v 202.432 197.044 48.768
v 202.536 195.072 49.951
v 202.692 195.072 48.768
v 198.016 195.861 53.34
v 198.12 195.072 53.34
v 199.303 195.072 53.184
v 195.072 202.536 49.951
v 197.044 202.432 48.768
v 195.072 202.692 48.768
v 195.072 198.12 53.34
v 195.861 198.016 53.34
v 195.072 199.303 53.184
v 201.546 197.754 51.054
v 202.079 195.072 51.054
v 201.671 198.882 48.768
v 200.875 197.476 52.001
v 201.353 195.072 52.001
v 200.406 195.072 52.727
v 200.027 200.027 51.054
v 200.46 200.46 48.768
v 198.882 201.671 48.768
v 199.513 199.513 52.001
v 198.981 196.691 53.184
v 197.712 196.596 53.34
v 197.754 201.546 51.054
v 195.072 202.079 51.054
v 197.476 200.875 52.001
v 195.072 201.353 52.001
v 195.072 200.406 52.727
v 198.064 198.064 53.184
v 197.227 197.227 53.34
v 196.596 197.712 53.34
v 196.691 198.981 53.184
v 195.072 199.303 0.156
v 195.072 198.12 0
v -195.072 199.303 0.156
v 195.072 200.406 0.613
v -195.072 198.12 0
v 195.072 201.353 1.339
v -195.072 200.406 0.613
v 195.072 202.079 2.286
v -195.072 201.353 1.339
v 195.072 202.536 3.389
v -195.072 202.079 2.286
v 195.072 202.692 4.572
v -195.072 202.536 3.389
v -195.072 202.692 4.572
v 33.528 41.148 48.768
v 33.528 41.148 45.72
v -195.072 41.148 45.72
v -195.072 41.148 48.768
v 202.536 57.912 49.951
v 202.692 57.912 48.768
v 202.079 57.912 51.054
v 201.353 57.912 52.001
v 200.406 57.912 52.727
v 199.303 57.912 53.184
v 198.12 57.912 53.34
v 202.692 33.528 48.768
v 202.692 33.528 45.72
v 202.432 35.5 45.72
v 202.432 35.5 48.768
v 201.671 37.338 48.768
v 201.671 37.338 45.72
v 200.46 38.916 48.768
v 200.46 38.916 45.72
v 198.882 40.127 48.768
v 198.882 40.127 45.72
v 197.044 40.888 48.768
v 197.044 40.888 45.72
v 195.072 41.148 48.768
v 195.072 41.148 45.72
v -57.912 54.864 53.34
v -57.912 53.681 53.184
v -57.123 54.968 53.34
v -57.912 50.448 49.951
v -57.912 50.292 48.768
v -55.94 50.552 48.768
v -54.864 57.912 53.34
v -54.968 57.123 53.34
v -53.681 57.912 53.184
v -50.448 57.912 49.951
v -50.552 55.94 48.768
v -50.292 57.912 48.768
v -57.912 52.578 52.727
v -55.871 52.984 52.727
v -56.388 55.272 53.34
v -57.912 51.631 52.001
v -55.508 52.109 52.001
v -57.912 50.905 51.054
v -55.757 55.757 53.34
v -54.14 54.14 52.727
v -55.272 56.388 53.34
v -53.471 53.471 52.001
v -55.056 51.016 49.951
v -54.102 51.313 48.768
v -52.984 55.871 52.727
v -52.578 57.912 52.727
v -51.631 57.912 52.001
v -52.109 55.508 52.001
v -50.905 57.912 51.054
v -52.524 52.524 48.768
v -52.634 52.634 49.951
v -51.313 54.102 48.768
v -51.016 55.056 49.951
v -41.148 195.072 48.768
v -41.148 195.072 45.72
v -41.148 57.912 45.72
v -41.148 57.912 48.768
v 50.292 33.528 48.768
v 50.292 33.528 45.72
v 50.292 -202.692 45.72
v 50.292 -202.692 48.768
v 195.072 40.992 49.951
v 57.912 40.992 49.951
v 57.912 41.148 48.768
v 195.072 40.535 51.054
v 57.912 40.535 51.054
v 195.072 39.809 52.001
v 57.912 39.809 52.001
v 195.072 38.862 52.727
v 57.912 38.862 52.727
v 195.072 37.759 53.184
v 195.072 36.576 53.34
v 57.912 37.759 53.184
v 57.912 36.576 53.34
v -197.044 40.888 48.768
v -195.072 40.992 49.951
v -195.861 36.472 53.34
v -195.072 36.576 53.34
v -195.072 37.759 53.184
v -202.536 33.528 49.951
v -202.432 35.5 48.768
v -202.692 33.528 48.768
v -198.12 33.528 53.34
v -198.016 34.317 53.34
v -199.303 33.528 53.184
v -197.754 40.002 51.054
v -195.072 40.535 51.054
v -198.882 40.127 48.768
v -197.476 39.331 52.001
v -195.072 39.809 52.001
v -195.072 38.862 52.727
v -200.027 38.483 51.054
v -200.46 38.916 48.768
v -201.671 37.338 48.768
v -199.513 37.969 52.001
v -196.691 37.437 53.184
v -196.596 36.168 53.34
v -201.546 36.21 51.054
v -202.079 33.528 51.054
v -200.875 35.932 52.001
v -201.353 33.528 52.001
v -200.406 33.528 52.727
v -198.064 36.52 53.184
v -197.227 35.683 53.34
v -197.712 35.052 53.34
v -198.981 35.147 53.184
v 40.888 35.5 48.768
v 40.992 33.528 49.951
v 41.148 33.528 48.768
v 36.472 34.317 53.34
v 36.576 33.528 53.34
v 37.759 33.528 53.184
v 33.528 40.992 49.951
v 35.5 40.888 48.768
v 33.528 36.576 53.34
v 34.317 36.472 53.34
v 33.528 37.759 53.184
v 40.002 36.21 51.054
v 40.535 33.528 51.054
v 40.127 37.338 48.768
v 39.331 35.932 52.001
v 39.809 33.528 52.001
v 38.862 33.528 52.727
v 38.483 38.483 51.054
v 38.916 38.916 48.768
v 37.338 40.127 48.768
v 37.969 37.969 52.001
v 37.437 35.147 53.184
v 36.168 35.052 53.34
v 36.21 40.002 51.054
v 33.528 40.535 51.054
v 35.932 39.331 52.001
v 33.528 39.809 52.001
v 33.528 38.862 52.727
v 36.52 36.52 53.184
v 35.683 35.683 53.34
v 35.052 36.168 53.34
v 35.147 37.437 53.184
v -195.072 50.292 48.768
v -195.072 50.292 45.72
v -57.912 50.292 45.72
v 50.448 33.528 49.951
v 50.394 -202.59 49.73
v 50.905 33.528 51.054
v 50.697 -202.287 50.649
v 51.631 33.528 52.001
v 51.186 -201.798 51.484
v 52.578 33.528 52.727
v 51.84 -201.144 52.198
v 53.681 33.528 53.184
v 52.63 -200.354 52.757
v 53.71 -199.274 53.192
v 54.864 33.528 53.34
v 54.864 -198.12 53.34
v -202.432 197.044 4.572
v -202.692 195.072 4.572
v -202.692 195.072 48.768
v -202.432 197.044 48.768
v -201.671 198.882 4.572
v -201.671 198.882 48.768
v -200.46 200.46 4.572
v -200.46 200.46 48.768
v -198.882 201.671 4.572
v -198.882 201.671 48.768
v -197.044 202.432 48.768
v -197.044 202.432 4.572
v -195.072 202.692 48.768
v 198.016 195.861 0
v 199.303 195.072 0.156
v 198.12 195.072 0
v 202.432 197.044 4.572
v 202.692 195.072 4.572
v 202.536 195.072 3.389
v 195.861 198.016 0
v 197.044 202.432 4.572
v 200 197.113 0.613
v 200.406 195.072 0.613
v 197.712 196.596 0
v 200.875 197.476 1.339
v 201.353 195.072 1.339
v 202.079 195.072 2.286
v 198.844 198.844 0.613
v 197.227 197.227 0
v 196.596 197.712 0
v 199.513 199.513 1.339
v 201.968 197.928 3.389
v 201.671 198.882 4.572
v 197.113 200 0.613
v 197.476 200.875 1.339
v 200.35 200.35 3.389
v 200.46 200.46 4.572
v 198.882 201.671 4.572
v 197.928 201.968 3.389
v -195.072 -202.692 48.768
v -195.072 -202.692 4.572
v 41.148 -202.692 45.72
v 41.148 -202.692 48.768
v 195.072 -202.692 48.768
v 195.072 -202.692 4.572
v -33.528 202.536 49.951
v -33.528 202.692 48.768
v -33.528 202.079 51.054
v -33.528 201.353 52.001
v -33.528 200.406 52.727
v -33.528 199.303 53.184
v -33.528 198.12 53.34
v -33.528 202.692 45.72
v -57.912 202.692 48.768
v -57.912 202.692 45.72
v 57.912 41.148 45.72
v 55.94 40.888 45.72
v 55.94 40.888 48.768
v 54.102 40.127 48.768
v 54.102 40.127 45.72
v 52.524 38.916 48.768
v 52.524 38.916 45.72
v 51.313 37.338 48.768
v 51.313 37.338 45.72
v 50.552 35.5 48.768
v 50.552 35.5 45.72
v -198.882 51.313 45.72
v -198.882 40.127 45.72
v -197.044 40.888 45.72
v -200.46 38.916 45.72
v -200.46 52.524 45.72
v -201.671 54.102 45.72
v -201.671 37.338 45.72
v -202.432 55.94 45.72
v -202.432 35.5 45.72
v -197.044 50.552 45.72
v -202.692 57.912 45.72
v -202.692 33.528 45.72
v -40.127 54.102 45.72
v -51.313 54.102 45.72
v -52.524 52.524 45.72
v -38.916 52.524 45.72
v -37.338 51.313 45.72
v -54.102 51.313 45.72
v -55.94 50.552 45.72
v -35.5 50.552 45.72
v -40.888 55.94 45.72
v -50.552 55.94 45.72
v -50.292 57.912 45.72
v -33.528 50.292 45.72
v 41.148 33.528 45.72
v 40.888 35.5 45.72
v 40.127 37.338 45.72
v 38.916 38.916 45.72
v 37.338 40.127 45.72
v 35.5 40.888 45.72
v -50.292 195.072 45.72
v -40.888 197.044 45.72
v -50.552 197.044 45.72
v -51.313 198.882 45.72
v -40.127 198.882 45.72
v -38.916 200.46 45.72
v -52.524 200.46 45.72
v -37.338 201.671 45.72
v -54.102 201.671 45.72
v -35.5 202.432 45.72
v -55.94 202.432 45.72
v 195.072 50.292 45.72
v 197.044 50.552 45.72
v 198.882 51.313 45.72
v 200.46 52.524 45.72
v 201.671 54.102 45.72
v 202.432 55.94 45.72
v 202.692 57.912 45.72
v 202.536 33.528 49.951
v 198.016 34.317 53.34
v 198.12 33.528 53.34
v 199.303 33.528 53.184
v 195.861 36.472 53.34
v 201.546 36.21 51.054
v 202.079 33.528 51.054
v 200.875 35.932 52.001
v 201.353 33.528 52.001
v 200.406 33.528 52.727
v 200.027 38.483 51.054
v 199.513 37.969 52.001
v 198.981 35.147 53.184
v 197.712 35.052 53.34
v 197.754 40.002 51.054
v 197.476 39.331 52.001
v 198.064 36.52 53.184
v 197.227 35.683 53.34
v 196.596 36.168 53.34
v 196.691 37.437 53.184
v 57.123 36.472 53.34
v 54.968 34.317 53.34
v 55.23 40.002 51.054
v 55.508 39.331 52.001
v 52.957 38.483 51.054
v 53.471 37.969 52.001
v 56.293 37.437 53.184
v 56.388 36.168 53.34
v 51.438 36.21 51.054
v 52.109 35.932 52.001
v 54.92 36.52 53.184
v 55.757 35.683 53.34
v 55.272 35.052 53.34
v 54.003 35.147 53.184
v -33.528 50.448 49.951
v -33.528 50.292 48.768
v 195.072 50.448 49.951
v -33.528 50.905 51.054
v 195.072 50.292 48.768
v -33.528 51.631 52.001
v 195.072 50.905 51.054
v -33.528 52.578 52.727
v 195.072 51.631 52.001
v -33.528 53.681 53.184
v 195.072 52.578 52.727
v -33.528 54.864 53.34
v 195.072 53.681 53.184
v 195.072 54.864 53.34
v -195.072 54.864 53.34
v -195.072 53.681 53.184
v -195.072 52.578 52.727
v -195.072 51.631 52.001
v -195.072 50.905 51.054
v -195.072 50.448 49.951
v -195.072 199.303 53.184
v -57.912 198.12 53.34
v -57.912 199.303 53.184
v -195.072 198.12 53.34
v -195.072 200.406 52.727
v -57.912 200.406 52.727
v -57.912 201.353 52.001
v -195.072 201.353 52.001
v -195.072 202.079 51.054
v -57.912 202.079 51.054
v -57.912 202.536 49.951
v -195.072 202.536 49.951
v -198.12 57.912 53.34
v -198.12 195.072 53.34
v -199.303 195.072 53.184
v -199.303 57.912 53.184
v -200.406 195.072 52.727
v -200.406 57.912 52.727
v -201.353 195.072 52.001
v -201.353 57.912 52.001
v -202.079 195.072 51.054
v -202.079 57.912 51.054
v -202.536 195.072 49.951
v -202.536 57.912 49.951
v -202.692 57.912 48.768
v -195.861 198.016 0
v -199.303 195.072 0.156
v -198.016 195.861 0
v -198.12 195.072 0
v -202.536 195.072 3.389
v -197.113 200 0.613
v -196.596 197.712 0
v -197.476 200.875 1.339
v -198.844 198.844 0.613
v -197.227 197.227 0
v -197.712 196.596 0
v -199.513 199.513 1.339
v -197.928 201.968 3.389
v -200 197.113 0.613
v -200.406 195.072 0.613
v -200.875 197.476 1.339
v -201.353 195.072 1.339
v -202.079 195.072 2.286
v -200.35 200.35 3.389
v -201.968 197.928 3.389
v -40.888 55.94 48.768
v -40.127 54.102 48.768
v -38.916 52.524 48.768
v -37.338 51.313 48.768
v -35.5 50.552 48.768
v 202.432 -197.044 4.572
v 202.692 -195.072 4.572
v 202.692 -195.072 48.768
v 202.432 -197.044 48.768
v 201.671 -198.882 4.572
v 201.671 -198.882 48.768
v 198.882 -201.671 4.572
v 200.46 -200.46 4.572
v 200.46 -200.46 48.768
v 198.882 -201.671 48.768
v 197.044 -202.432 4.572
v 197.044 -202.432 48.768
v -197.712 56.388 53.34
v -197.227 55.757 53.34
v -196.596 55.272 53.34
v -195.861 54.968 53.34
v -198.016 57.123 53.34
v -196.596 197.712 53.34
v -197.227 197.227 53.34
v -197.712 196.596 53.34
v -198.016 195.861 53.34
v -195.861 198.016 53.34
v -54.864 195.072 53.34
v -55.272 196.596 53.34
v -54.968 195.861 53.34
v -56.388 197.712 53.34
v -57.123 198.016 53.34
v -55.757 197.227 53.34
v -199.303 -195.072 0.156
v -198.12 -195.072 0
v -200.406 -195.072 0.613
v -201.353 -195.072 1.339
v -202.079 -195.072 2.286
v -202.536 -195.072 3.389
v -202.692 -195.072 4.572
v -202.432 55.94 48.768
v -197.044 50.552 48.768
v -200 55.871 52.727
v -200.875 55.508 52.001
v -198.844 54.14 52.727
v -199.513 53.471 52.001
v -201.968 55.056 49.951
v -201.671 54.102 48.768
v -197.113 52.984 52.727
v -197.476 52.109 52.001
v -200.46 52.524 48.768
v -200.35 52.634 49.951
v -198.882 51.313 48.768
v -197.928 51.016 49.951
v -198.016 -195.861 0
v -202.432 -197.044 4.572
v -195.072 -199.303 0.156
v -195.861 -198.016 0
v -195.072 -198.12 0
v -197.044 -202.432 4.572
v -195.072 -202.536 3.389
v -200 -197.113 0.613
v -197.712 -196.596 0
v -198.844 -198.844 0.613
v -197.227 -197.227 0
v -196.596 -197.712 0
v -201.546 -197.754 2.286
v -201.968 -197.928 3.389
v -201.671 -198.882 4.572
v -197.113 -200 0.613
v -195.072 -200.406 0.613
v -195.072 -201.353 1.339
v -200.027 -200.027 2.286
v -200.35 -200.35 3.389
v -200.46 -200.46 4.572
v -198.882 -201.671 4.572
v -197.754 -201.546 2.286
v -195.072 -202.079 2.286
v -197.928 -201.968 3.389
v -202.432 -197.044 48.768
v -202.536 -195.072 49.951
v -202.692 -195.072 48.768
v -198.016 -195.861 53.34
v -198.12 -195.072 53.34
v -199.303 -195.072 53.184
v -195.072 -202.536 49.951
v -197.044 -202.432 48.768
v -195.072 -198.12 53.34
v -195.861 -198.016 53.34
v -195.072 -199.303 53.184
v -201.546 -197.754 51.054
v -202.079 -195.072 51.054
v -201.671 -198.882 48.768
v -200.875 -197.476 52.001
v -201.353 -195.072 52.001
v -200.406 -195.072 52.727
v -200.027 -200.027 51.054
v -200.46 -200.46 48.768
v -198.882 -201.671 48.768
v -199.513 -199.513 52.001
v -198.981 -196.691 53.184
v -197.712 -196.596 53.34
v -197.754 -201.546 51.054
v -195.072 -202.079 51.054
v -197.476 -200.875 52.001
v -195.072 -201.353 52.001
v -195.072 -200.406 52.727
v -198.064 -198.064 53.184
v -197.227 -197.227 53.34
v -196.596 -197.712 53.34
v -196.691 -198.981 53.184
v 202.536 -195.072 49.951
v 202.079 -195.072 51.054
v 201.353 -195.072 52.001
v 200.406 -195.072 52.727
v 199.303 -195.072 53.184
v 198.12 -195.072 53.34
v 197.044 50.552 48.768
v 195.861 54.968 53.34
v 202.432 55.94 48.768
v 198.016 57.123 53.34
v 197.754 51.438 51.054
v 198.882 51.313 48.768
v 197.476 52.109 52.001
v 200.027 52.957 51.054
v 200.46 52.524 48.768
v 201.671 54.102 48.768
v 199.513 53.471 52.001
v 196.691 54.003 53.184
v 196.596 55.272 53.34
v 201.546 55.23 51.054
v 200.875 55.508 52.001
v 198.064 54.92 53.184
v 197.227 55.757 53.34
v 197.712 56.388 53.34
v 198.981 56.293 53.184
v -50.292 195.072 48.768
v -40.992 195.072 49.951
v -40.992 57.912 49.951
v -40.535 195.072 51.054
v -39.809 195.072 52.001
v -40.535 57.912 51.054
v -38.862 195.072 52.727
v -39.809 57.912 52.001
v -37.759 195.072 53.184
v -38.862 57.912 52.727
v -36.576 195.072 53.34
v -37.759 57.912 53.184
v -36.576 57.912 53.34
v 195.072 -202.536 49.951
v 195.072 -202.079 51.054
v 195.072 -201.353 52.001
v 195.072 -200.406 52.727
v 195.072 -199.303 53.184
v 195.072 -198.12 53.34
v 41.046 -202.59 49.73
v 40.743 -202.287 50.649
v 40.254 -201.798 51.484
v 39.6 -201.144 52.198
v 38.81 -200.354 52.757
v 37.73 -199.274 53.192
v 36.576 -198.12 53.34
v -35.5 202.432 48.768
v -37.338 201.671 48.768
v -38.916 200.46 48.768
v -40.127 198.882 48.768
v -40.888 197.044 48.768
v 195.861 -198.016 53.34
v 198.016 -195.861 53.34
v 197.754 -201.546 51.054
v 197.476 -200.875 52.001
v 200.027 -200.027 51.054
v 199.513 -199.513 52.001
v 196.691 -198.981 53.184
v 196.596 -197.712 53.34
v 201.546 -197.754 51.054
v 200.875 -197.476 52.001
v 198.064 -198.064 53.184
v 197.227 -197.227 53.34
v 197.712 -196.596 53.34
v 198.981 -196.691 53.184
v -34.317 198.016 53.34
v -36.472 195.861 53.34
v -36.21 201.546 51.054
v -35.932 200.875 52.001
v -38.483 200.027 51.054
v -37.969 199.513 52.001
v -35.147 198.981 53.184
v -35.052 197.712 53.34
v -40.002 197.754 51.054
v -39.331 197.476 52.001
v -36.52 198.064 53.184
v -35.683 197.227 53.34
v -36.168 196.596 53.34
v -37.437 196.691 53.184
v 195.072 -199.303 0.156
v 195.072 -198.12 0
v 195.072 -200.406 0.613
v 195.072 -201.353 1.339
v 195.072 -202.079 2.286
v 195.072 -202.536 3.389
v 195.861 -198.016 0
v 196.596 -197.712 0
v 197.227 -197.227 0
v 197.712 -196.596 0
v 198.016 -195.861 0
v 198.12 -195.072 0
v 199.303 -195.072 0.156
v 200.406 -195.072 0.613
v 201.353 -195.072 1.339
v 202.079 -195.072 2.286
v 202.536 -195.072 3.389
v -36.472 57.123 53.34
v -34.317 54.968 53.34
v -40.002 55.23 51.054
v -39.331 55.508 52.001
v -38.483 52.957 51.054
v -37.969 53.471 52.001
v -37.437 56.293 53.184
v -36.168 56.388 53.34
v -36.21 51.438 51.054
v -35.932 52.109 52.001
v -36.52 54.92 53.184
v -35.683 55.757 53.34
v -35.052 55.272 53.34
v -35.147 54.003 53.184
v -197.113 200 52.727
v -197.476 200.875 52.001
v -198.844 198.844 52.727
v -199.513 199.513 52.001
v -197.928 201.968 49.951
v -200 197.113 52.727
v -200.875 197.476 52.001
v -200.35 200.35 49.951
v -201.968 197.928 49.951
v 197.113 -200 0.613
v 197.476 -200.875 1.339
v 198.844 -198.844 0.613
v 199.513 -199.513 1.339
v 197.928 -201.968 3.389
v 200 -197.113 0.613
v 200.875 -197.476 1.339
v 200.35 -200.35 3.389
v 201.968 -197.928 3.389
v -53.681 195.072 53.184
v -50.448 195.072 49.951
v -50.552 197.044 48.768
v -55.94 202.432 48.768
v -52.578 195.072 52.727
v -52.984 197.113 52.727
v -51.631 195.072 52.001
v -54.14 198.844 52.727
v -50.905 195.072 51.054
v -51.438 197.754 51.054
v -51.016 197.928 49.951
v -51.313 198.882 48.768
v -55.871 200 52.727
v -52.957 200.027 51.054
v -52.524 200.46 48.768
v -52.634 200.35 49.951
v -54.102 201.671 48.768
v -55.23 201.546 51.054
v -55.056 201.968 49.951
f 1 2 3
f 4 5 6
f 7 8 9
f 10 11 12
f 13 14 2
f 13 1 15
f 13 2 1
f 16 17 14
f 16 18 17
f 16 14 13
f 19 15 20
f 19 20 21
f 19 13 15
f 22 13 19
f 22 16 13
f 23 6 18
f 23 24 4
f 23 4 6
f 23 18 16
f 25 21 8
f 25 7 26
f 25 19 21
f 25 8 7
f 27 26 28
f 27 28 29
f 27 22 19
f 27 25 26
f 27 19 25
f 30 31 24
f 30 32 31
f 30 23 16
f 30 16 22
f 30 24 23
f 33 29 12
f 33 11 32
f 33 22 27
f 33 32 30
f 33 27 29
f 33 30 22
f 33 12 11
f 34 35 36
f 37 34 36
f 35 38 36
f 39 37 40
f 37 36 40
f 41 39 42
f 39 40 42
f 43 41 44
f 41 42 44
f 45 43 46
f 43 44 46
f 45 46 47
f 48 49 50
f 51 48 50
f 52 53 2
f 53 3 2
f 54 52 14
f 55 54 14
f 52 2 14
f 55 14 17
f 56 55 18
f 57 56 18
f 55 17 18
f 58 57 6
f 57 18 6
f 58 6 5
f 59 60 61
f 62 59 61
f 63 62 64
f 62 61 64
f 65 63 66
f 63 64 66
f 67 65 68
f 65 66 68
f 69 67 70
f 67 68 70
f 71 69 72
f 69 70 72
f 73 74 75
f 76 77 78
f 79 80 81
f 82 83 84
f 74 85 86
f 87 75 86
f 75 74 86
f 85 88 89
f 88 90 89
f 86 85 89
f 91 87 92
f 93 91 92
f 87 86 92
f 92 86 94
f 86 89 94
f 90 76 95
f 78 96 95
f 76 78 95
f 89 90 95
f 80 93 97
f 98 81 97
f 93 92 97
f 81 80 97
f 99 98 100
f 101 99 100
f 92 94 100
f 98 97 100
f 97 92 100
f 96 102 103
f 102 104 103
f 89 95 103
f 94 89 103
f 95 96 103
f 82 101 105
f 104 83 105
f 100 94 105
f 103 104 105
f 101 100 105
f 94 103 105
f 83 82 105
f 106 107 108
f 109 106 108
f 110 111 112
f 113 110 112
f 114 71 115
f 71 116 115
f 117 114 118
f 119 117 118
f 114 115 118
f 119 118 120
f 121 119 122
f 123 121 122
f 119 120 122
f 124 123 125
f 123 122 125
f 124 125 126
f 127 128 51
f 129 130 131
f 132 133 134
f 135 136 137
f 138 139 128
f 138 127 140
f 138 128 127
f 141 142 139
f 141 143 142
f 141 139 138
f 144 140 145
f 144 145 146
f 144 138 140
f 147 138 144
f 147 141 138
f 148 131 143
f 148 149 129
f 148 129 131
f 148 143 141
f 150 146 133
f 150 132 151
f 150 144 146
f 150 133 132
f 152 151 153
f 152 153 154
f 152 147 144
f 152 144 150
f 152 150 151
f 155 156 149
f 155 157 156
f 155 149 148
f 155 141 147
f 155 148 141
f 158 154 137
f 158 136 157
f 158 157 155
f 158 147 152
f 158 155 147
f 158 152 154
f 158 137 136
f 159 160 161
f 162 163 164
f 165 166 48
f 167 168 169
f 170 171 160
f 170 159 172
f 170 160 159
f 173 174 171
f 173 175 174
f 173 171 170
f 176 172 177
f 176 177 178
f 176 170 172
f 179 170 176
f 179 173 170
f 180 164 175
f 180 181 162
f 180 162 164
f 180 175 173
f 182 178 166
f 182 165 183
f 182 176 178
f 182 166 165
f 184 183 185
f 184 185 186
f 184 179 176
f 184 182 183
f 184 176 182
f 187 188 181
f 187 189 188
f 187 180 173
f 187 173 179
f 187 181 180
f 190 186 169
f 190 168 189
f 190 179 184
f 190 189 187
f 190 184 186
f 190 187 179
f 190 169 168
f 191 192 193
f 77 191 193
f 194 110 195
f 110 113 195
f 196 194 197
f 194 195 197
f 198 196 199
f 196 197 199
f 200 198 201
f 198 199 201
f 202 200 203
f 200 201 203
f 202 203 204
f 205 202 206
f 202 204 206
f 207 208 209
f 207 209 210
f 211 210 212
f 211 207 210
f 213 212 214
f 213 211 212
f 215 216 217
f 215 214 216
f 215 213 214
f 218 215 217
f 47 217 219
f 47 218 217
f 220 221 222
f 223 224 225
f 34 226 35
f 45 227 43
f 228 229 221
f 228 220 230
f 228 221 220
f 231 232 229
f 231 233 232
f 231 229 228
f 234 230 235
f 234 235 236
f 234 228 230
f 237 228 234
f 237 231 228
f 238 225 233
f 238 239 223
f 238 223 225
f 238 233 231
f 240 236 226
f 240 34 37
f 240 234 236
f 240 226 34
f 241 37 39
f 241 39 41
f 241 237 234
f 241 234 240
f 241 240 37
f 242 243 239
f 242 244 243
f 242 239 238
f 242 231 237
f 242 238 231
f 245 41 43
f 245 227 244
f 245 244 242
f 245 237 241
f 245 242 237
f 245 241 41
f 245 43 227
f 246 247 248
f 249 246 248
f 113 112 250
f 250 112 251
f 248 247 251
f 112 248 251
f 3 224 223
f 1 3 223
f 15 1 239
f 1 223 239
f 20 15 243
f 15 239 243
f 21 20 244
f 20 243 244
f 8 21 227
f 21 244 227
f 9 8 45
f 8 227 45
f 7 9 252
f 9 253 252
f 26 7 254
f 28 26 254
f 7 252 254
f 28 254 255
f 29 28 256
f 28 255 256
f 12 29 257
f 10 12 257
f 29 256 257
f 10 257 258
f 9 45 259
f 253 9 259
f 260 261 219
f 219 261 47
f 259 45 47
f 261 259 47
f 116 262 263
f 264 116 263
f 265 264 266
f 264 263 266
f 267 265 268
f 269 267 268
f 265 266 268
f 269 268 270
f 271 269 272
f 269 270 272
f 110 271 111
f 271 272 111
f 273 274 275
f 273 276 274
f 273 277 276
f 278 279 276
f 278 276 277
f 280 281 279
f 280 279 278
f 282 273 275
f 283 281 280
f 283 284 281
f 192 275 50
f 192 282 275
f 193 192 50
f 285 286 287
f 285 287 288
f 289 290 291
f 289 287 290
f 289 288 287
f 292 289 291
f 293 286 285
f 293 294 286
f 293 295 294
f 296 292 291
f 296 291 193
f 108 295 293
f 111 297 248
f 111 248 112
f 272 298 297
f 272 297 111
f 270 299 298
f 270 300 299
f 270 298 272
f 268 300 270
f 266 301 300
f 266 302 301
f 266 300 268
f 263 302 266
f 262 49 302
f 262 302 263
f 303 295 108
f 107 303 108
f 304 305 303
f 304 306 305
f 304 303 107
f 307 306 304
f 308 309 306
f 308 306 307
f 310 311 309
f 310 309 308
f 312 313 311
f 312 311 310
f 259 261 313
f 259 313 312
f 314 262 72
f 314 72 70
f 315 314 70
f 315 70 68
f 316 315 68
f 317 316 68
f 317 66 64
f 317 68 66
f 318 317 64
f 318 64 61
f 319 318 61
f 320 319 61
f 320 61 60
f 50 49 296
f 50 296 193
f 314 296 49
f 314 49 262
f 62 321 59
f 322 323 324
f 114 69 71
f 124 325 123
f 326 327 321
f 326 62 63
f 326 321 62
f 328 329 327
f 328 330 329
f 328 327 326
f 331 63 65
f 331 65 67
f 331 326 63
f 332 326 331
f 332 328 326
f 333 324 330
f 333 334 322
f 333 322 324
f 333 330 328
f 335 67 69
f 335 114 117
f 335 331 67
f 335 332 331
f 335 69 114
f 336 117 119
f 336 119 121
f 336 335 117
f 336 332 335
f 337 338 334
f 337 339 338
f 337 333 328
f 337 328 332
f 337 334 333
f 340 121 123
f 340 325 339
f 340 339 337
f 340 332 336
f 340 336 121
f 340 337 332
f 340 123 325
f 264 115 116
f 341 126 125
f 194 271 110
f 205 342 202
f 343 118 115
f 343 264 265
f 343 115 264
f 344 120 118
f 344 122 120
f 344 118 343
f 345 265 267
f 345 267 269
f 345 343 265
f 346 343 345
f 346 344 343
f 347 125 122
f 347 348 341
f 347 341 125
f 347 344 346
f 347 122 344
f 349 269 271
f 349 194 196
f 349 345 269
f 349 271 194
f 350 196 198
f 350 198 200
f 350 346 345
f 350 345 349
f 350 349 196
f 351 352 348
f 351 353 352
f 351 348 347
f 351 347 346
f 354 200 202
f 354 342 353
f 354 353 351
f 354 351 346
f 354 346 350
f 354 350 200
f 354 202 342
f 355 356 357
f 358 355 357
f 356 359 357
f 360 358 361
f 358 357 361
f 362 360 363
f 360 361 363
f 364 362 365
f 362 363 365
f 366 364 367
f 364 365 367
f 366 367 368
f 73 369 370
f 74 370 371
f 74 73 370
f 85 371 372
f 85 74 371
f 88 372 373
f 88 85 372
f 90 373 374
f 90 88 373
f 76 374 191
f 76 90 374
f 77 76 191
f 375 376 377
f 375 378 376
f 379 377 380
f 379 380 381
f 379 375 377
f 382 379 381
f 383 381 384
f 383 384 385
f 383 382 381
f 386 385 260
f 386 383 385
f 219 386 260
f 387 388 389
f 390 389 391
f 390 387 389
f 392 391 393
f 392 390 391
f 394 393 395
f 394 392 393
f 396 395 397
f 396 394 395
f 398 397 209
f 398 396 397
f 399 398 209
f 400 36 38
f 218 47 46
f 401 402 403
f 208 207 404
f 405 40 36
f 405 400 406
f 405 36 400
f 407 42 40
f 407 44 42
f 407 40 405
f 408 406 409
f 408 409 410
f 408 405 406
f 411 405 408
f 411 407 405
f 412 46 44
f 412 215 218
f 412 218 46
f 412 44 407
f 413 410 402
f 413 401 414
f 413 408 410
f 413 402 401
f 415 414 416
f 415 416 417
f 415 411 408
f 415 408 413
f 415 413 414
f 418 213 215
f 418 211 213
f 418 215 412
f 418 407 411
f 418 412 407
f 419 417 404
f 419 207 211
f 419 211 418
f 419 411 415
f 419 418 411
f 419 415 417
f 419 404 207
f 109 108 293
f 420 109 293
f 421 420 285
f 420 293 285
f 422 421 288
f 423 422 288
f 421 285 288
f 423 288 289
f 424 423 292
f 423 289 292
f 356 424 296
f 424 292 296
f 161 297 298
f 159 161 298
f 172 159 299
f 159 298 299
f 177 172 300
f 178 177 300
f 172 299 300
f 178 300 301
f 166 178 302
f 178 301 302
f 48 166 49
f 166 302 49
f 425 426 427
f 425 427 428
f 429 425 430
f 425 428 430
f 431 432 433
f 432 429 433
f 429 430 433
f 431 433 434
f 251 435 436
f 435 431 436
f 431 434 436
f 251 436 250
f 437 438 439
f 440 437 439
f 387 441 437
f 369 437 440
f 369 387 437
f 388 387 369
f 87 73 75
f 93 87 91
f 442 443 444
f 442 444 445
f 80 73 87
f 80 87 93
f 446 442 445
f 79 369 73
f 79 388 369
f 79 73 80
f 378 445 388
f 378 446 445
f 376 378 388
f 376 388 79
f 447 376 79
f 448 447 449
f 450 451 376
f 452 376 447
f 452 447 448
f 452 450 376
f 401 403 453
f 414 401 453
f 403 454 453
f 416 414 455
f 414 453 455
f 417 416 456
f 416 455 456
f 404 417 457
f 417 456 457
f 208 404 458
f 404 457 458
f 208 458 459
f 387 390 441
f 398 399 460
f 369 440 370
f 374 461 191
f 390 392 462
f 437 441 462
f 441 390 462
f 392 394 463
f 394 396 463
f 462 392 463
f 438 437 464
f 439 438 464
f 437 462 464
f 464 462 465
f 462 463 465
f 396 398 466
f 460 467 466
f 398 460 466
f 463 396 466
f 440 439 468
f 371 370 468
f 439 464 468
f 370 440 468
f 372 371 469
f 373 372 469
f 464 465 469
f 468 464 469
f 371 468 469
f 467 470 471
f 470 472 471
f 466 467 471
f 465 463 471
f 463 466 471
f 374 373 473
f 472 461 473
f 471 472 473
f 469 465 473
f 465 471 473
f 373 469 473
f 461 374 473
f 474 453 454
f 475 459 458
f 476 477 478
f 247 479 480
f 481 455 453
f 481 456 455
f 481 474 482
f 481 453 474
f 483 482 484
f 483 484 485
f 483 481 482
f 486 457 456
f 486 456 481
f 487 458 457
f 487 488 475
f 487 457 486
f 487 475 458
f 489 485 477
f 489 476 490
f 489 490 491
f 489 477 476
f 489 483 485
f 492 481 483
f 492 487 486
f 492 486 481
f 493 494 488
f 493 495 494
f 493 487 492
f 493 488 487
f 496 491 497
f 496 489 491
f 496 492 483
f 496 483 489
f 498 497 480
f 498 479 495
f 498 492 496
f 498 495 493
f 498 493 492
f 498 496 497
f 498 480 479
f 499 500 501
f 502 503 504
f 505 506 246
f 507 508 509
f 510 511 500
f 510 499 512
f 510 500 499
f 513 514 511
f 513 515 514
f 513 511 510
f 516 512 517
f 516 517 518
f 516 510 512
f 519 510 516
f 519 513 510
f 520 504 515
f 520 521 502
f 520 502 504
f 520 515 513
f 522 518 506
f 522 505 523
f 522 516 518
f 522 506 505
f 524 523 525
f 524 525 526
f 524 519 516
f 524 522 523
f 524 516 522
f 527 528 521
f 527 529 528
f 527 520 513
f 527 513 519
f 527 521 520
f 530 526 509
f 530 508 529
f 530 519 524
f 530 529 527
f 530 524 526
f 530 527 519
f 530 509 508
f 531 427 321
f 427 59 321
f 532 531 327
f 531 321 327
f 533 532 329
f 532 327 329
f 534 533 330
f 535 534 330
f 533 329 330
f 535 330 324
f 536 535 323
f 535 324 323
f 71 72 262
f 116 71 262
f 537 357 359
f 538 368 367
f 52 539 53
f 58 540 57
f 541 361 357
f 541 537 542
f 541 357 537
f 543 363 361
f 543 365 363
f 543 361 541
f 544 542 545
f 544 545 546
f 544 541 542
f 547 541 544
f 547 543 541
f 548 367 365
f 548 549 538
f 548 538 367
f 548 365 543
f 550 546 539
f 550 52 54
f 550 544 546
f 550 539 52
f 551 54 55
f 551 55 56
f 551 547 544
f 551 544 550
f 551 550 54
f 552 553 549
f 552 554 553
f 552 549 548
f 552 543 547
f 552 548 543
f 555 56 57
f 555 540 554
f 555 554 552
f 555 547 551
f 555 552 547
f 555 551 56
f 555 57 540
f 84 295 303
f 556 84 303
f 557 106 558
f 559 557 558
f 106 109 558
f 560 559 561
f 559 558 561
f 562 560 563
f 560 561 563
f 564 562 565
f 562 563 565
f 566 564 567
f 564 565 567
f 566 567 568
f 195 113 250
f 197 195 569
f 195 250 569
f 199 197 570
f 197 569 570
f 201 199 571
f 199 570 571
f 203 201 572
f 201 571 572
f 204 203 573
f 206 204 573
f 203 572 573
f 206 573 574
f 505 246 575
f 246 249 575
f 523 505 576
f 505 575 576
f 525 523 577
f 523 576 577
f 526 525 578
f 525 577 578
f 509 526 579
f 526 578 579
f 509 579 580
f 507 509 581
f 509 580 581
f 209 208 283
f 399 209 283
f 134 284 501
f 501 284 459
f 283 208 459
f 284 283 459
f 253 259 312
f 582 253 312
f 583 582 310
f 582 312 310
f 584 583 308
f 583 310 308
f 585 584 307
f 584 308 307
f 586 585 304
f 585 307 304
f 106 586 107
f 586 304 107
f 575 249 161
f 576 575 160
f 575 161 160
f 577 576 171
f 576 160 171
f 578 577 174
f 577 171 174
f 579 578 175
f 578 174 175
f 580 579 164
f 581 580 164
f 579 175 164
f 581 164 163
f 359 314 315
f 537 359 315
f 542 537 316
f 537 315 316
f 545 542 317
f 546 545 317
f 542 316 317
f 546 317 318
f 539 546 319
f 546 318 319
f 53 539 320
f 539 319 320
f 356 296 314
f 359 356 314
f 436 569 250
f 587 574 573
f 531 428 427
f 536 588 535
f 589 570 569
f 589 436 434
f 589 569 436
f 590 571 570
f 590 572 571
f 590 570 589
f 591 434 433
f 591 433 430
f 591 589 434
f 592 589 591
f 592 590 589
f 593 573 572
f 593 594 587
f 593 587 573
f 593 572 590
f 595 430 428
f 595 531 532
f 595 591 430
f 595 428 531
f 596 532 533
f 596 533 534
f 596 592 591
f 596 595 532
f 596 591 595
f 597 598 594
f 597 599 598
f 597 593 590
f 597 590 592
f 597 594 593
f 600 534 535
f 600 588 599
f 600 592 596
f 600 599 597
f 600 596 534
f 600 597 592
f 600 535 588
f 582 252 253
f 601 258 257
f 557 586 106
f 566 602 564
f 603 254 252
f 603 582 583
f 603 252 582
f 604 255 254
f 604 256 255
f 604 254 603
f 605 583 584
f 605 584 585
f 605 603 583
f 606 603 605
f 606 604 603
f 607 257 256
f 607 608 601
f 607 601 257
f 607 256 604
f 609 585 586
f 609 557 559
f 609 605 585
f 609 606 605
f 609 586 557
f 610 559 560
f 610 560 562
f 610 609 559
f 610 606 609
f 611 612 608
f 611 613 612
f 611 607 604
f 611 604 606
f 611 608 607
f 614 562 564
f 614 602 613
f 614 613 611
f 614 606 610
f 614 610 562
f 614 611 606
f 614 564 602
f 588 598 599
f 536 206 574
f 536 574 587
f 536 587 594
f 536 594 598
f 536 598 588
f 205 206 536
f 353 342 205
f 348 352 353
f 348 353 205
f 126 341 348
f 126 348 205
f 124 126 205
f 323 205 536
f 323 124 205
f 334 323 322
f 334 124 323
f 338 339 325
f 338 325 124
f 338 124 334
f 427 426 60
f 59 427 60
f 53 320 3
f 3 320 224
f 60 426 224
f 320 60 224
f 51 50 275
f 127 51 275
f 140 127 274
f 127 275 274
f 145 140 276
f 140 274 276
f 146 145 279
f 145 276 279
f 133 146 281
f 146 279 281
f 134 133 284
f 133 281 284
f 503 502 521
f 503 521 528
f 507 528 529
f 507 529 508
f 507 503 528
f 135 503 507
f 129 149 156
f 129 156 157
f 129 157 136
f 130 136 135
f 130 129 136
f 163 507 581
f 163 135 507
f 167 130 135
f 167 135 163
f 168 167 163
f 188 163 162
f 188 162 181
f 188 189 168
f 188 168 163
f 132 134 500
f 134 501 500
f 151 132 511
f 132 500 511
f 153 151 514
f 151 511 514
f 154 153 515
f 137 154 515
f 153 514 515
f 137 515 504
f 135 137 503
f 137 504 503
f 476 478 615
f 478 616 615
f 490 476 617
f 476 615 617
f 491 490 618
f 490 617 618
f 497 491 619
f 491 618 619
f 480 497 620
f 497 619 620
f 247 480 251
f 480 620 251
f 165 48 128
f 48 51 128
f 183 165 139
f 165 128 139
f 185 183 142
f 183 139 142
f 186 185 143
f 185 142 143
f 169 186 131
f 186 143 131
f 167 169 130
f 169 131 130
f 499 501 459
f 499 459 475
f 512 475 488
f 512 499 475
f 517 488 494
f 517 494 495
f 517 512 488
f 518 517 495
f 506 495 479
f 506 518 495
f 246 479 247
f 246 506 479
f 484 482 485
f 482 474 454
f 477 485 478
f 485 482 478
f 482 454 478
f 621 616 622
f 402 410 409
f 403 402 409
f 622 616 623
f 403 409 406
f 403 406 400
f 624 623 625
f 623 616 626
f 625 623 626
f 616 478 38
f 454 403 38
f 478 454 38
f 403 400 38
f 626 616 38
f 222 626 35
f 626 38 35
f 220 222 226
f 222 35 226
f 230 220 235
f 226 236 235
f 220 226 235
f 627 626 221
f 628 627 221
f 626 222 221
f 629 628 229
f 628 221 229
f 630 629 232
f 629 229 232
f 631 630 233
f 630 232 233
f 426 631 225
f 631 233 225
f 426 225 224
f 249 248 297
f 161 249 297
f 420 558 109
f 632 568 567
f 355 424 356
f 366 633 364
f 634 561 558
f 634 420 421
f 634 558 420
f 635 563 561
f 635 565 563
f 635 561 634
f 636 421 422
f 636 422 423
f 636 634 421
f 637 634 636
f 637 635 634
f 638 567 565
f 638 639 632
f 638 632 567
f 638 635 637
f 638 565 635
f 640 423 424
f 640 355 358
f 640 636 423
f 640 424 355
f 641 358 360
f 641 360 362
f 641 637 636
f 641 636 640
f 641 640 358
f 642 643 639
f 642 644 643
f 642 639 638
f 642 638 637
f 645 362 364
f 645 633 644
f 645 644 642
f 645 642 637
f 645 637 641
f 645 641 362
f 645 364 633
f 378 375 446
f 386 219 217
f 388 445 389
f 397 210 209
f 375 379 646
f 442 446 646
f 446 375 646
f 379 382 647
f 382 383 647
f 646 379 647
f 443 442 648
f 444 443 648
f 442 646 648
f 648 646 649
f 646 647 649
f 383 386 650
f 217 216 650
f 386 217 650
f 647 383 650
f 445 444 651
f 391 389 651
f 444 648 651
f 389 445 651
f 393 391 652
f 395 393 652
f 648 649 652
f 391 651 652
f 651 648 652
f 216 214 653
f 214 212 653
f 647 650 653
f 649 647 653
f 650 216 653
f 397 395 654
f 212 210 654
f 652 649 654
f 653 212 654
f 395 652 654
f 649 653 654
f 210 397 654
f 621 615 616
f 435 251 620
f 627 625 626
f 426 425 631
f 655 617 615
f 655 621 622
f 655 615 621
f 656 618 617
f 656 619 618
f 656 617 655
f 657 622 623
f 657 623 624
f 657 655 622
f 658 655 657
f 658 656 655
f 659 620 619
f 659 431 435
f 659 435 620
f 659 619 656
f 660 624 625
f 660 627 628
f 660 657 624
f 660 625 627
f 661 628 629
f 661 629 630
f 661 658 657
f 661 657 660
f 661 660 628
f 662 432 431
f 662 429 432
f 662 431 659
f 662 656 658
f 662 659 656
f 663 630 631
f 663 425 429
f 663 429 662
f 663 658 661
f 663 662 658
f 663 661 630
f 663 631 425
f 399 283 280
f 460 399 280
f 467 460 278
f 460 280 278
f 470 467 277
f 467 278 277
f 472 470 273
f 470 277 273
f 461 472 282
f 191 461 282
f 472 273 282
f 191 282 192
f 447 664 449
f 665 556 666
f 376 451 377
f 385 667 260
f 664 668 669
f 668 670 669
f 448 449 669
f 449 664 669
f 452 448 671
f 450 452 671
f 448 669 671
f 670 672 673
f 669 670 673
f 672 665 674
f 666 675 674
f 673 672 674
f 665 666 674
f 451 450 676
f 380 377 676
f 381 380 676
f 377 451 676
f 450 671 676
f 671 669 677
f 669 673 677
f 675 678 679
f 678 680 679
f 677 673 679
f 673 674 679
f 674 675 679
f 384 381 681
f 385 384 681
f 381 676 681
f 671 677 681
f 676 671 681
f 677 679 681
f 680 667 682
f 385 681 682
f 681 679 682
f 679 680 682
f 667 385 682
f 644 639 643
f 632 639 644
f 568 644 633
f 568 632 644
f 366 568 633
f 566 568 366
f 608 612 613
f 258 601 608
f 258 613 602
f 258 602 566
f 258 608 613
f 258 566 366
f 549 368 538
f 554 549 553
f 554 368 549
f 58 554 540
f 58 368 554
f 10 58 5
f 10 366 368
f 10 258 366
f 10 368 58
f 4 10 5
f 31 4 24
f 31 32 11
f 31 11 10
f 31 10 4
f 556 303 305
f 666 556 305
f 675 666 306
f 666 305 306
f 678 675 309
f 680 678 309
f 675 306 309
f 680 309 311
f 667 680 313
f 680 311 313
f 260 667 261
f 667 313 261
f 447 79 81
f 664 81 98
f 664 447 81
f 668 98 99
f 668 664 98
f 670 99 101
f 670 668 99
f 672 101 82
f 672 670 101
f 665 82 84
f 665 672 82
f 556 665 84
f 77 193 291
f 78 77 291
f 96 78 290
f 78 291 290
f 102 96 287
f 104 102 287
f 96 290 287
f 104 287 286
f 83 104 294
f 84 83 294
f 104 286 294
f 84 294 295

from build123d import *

# Parameters (mm, degrees)
F0_W     = 405.384
F0_H     = 405.384
F1_DEPTH = 45.72
F3_DEPTH = 7.62
F4_R     = 7.62
F5_R     = 4.572


with BuildPart() as f1:
    # F0 (on Top) → F1 (new body)
    with BuildSketch(Plane.XY):
        Rectangle(F0_W, F0_H)
    extrude(amount=F1_DEPTH)

    # F2 (on face) → F3 (join)
    with BuildSketch(Plane.XY.offset(45.72)):
        with BuildLine():
            Line((-202.692, 202.692), (-202.692, 57.912))
            ThreePointArc((-202.692, 57.912), (-200.460154, 52.523846), (-195.072, 50.292))
            Line((-195.072, 50.292), (-57.912, 50.292))
            ThreePointArc((-57.912, 50.292), (-52.523846, 52.523846), (-50.292, 57.912))
            Line((-50.292, 57.912), (-50.292, 195.072))
            ThreePointArc((-50.292, 195.072), (-52.523846, 200.460154), (-57.912, 202.692))
            Line((-57.912, 202.692), (-202.692, 202.692))
        make_face()
        with BuildLine():
            ThreePointArc((195.072, 50.292), (200.460154, 52.523846), (202.692, 57.912))
            Line((202.692, 57.912), (202.692, 202.692))
            Line((202.692, 202.692), (-33.528, 202.692))
            ThreePointArc((-33.528, 202.692), (-38.916154, 200.460154), (-41.148, 195.072))
            Line((-41.148, 195.072), (-41.148, 57.912))
            ThreePointArc((-41.148, 57.912), (-38.916154, 52.523846), (-33.528, 50.292))
            Line((-33.528, 50.292), (195.072, 50.292))
        make_face()
        with BuildLine():
            Line((50.292, 33.528), (50.292, -202.692))
            Line((50.292, -202.692), (202.692, -202.692))
            Line((202.692, -202.692), (202.692, 33.528))
            ThreePointArc((202.692, 33.528), (200.460154, 38.916154), (195.072, 41.148))
            Line((195.072, 41.148), (57.912, 41.148))
            ThreePointArc((57.912, 41.148), (52.523846, 38.916154), (50.292, 33.528))
        make_face()
        with BuildLine():
            Line((-202.692, 33.528), (-202.692, -202.692))
            Line((-202.692, -202.692), (41.148, -202.692))
            Line((41.148, -202.692), (41.148, 33.528))
            ThreePointArc((41.148, 33.528), (38.916154, 38.916154), (33.528, 41.148))
            Line((33.528, 41.148), (-195.072, 41.148))
            ThreePointArc((-195.072, 41.148), (-200.460154, 38.916154), (-202.692, 33.528))
        make_face()
    extrude(amount=F3_DEPTH)

    # F4
    f4_edges = [f1.edges().sort_by_distance(p)[0] for p in [
        (-202.692, 202.692, 26.67),
        (202.692, 202.692, 26.67),
        (202.692, -202.692, 26.67),
        (-202.692, -202.692, 26.67),
    ]]
    fillet(f4_edges, radius=F4_R)

    # F5
    f5_edges = [f1.edges().sort_by_distance(p)[0] for p in [
        (202.692, 126.492, 53.34),
        (200.460154, 200.460154, 53.34),
        (200.460154, 52.523846, 53.34),
        (80.772, 202.692, 53.34),
        (80.772, 50.292, 53.34),
        (-38.916154, 200.460154, 53.34),
        (-38.916154, 52.523846, 53.34),
        (-41.148, 126.492, 53.34),
        (122.682, -202.692, 53.34),
        (200.460154, -200.460154, 53.34),
        (50.292, -84.582, 53.34),
        (202.692, -80.772, 53.34),
        (52.523846, 38.916154, 53.34),
        (200.460154, 38.916154, 53.34),
        (126.492, 41.148, 53.34),
        (-202.692, -80.772, 53.34),
        (-200.460154, -200.460154, 53.34),
        (-200.460154, 38.916154, 53.34),
        (-76.962, -202.692, 53.34),
        (-80.772, 41.148, 53.34),
        (41.148, -84.582, 53.34),
        (38.916154, 38.916154, 53.34),
        (-126.492, 202.692, 53.34),
        (-200.460154, 200.460154, 53.34),
        (-52.523846, 200.460154, 53.34),
        (-202.692, 126.492, 53.34),
        (-50.292, 126.492, 53.34),
        (-200.460154, 52.523846, 53.34),
        (-52.523846, 52.523846, 53.34),
        (-126.492, 50.292, 53.34),
        (0, -202.692, 0),
        (-200.460154, -200.460154, 0),
        (200.460154, -200.460154, 0),
        (-202.692, 0, 0),
        (202.692, 0, 0),
        (-200.460154, 200.460154, 0),
        (200.460154, 200.460154, 0),
        (0, 202.692, 0),
    ]]
    fillet(f5_edges, radius=F5_R)


solid = f1.part
